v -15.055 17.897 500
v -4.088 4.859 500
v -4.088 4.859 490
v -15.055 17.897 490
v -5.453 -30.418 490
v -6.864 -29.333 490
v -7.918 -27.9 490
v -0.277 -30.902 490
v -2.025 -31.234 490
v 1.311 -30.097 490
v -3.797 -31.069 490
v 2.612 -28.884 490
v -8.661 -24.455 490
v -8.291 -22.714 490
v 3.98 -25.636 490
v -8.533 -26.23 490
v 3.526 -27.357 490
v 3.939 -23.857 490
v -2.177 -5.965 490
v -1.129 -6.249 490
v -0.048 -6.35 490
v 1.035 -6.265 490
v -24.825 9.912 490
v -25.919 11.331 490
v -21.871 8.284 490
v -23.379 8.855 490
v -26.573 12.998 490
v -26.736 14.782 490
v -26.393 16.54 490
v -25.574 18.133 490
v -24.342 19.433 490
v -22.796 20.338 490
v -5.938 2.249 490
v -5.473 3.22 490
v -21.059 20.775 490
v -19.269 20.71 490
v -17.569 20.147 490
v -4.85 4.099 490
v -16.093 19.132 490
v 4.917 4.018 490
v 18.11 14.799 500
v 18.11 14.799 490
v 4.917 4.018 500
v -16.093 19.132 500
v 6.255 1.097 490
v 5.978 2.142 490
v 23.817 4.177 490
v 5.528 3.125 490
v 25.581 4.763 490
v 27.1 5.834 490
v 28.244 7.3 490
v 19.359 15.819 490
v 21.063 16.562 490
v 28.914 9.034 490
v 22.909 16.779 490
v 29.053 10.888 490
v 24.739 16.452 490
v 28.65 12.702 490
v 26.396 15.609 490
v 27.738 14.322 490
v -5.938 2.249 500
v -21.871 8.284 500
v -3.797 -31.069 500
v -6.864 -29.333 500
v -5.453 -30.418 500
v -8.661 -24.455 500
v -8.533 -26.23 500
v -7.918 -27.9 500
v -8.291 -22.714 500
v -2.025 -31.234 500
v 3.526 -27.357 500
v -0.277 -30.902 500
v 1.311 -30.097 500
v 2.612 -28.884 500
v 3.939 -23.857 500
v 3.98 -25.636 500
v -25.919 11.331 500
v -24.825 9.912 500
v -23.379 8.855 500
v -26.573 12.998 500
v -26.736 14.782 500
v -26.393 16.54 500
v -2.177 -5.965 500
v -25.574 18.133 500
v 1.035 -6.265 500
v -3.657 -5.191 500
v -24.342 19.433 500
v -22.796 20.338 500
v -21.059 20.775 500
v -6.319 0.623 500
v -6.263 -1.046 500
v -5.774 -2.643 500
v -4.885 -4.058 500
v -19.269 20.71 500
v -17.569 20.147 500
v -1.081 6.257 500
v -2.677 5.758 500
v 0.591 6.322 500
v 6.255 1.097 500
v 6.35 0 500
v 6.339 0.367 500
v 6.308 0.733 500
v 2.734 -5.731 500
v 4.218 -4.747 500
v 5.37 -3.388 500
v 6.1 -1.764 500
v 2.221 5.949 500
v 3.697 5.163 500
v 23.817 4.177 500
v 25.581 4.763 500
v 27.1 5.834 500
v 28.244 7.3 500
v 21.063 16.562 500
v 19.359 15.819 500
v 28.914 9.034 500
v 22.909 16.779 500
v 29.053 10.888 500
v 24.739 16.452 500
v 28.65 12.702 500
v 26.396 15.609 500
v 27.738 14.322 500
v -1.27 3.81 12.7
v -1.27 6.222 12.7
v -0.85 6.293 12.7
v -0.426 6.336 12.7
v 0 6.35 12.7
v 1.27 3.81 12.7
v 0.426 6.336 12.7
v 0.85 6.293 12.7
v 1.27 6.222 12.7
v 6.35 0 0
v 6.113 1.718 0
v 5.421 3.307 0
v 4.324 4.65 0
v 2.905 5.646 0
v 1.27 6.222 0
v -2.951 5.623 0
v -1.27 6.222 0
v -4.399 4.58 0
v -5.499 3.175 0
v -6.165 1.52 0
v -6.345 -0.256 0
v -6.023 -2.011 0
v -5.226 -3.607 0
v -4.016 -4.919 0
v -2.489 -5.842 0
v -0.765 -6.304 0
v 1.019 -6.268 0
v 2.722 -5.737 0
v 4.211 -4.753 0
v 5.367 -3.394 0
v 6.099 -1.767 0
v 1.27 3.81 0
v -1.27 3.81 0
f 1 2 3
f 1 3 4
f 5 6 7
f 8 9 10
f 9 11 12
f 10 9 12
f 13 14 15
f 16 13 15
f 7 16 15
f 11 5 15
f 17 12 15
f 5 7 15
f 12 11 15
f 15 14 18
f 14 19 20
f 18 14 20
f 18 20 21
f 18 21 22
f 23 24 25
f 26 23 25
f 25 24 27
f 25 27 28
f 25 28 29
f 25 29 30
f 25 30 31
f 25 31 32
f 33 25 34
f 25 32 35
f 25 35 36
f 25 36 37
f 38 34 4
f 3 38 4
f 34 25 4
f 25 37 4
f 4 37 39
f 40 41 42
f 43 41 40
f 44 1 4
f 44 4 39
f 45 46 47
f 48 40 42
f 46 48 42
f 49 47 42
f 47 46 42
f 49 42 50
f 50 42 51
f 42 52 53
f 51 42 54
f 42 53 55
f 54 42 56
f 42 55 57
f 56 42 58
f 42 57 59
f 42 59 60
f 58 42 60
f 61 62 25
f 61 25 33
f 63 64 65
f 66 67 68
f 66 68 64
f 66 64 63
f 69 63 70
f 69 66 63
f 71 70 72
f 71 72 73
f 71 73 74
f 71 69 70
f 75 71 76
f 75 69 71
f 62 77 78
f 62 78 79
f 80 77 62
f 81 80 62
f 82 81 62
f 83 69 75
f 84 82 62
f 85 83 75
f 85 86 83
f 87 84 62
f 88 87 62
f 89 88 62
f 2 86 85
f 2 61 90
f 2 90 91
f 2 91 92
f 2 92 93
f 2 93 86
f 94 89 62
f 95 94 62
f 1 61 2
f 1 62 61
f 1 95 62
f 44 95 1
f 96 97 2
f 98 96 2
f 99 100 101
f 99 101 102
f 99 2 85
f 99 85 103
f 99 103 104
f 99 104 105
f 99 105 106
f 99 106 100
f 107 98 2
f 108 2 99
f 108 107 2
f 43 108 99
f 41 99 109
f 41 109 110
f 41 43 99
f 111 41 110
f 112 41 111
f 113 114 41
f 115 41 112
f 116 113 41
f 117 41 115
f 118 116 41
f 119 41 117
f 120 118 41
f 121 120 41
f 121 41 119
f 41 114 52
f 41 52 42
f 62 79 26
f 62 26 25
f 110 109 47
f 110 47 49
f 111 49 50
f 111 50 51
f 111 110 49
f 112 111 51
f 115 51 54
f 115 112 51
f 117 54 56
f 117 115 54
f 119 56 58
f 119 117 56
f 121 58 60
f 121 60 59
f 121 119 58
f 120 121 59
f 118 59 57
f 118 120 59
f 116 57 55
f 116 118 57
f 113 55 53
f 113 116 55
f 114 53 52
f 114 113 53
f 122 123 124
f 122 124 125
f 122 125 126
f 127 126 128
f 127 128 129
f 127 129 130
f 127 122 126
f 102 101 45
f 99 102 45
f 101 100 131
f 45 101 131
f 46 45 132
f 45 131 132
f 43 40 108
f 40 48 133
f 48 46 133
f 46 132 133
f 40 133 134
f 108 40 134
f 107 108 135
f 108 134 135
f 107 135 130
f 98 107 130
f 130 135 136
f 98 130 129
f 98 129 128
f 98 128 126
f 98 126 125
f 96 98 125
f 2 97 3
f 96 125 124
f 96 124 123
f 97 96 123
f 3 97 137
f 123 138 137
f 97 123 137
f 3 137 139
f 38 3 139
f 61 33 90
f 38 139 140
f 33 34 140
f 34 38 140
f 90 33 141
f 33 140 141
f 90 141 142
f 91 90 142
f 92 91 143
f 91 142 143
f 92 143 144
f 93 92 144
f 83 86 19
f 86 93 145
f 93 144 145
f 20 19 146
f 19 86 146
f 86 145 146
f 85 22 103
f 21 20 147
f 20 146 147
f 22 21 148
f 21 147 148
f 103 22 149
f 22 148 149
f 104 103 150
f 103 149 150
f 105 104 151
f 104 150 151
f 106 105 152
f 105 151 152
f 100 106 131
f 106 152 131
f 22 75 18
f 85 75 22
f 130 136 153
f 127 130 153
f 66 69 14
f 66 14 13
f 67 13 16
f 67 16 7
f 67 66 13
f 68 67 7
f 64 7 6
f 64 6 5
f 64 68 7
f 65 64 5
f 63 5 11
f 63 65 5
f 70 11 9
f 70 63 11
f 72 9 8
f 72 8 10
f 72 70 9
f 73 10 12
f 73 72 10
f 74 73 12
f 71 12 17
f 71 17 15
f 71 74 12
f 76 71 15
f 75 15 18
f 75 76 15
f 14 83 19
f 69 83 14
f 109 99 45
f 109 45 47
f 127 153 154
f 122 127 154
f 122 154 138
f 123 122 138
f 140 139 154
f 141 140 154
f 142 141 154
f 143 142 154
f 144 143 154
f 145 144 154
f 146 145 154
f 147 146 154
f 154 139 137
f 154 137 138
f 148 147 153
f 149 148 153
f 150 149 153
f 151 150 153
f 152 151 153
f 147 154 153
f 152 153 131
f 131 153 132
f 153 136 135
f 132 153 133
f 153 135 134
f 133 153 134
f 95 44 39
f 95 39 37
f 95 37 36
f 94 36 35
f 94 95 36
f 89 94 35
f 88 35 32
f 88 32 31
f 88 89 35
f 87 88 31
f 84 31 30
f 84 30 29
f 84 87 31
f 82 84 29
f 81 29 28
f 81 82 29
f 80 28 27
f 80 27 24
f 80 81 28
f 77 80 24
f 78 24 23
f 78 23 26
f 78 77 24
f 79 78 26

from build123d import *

# Parameters (mm, degrees)
F0_R     = 6.35
F1_DEPTH = 500
F3_DEPTH = 10
F5_DEPTH = 12.7


with BuildPart() as f1:
    # F0 (on Top) → F1 (new body)
    with BuildSketch(Plane.XY):
        Circle(F0_R)
    extrude(amount=F1_DEPTH)

    # F2 (on face) → F3 (join)
    with BuildSketch(Plane.XY.offset(500)):
        with BuildLine():
            Line((-4.0875947315, 4.8594309657), (-15.054643582, 17.89732251))
            Line((-15.054643582, 17.89732251), (-16.0928926438, 19.1316179753))
            ThreePointArc((-16.0928926438, 19.1316179753), (-25.5738890172, 18.1328072988), (-23.379079454, 8.855430192))
            Line((-23.379079454, 8.855430192), (-21.8707547639, 8.2841132578))
            Line((-21.8707547639, 8.2841132578), (-5.9382861813, 2.2492792688))
            ThreePointArc((-5.9382861813, 2.2492792688), (-5.1800381263, 3.6728333763), (-4.0875947315, 4.8594309657))
        make_face()
        with BuildLine():
            Line((18.109629911, 14.7985725966), (4.9170760776, 4.0180670536))
            ThreePointArc((4.9170760776, 4.0180670536), (5.7735991749, 2.6434924943), (6.2545341231, 1.096951641))
            Line((6.2545341231, 1.096951641), (23.8165818414, 4.1770718682))
            ThreePointArc((23.8165818414, 4.1770718682), (28.6497325197, 12.7023738091), (19.3585672347, 15.8191616282))
            Line((19.3585672347, 15.8191616282), (18.109629911, 14.7985725966))
        make_face()
        with BuildLine():
            Line((3.9393819064, -23.8570486481), (1.0345312657, -6.2651612158))
            ThreePointArc((1.0345312657, -6.2651612158), (-0.5907479446, -6.3224612981), (-2.1772790737, -5.96506126))
            Line((-2.1772790737, -5.96506126), (-8.2908405694, -22.7143008401))
            ThreePointArc((-8.2908405694, -22.7143008401), (-2.9165272541, -31.2140412119), (3.9393819064, -23.8570486481))
        make_face()
    extrude(amount=-F3_DEPTH)

    # F4 (on face) → F5 (cut)
    with BuildSketch(Plane(origin=(0, 0, 0), x_dir=(1, 0, 0), z_dir=(0, 0, -1))):
        with BuildLine():
            Line((1.27, -3.81), (0, -3.81))
            Line((0, -3.81), (0, -6.35))
            ThreePointArc((0, -6.35), (0.6382319087, -6.3178445716), (1.27, -6.2217039467))
            Line((1.27, -6.2217039467), (1.27, -3.81))
        make_face()
        with BuildLine():
            Line((0, -6.35), (0, -3.81))
            Line((0, -3.81), (-1.27, -3.81))
            Line((-1.27, -3.81), (-1.27, -6.2217039467))
            ThreePointArc((-1.27, -6.2217039467), (-0.6382319087, -6.3178445716), (0, -6.35))
        make_face()
    extrude(amount=-F5_DEPTH, mode=Mode.SUBTRACT)


solid = f1.part
